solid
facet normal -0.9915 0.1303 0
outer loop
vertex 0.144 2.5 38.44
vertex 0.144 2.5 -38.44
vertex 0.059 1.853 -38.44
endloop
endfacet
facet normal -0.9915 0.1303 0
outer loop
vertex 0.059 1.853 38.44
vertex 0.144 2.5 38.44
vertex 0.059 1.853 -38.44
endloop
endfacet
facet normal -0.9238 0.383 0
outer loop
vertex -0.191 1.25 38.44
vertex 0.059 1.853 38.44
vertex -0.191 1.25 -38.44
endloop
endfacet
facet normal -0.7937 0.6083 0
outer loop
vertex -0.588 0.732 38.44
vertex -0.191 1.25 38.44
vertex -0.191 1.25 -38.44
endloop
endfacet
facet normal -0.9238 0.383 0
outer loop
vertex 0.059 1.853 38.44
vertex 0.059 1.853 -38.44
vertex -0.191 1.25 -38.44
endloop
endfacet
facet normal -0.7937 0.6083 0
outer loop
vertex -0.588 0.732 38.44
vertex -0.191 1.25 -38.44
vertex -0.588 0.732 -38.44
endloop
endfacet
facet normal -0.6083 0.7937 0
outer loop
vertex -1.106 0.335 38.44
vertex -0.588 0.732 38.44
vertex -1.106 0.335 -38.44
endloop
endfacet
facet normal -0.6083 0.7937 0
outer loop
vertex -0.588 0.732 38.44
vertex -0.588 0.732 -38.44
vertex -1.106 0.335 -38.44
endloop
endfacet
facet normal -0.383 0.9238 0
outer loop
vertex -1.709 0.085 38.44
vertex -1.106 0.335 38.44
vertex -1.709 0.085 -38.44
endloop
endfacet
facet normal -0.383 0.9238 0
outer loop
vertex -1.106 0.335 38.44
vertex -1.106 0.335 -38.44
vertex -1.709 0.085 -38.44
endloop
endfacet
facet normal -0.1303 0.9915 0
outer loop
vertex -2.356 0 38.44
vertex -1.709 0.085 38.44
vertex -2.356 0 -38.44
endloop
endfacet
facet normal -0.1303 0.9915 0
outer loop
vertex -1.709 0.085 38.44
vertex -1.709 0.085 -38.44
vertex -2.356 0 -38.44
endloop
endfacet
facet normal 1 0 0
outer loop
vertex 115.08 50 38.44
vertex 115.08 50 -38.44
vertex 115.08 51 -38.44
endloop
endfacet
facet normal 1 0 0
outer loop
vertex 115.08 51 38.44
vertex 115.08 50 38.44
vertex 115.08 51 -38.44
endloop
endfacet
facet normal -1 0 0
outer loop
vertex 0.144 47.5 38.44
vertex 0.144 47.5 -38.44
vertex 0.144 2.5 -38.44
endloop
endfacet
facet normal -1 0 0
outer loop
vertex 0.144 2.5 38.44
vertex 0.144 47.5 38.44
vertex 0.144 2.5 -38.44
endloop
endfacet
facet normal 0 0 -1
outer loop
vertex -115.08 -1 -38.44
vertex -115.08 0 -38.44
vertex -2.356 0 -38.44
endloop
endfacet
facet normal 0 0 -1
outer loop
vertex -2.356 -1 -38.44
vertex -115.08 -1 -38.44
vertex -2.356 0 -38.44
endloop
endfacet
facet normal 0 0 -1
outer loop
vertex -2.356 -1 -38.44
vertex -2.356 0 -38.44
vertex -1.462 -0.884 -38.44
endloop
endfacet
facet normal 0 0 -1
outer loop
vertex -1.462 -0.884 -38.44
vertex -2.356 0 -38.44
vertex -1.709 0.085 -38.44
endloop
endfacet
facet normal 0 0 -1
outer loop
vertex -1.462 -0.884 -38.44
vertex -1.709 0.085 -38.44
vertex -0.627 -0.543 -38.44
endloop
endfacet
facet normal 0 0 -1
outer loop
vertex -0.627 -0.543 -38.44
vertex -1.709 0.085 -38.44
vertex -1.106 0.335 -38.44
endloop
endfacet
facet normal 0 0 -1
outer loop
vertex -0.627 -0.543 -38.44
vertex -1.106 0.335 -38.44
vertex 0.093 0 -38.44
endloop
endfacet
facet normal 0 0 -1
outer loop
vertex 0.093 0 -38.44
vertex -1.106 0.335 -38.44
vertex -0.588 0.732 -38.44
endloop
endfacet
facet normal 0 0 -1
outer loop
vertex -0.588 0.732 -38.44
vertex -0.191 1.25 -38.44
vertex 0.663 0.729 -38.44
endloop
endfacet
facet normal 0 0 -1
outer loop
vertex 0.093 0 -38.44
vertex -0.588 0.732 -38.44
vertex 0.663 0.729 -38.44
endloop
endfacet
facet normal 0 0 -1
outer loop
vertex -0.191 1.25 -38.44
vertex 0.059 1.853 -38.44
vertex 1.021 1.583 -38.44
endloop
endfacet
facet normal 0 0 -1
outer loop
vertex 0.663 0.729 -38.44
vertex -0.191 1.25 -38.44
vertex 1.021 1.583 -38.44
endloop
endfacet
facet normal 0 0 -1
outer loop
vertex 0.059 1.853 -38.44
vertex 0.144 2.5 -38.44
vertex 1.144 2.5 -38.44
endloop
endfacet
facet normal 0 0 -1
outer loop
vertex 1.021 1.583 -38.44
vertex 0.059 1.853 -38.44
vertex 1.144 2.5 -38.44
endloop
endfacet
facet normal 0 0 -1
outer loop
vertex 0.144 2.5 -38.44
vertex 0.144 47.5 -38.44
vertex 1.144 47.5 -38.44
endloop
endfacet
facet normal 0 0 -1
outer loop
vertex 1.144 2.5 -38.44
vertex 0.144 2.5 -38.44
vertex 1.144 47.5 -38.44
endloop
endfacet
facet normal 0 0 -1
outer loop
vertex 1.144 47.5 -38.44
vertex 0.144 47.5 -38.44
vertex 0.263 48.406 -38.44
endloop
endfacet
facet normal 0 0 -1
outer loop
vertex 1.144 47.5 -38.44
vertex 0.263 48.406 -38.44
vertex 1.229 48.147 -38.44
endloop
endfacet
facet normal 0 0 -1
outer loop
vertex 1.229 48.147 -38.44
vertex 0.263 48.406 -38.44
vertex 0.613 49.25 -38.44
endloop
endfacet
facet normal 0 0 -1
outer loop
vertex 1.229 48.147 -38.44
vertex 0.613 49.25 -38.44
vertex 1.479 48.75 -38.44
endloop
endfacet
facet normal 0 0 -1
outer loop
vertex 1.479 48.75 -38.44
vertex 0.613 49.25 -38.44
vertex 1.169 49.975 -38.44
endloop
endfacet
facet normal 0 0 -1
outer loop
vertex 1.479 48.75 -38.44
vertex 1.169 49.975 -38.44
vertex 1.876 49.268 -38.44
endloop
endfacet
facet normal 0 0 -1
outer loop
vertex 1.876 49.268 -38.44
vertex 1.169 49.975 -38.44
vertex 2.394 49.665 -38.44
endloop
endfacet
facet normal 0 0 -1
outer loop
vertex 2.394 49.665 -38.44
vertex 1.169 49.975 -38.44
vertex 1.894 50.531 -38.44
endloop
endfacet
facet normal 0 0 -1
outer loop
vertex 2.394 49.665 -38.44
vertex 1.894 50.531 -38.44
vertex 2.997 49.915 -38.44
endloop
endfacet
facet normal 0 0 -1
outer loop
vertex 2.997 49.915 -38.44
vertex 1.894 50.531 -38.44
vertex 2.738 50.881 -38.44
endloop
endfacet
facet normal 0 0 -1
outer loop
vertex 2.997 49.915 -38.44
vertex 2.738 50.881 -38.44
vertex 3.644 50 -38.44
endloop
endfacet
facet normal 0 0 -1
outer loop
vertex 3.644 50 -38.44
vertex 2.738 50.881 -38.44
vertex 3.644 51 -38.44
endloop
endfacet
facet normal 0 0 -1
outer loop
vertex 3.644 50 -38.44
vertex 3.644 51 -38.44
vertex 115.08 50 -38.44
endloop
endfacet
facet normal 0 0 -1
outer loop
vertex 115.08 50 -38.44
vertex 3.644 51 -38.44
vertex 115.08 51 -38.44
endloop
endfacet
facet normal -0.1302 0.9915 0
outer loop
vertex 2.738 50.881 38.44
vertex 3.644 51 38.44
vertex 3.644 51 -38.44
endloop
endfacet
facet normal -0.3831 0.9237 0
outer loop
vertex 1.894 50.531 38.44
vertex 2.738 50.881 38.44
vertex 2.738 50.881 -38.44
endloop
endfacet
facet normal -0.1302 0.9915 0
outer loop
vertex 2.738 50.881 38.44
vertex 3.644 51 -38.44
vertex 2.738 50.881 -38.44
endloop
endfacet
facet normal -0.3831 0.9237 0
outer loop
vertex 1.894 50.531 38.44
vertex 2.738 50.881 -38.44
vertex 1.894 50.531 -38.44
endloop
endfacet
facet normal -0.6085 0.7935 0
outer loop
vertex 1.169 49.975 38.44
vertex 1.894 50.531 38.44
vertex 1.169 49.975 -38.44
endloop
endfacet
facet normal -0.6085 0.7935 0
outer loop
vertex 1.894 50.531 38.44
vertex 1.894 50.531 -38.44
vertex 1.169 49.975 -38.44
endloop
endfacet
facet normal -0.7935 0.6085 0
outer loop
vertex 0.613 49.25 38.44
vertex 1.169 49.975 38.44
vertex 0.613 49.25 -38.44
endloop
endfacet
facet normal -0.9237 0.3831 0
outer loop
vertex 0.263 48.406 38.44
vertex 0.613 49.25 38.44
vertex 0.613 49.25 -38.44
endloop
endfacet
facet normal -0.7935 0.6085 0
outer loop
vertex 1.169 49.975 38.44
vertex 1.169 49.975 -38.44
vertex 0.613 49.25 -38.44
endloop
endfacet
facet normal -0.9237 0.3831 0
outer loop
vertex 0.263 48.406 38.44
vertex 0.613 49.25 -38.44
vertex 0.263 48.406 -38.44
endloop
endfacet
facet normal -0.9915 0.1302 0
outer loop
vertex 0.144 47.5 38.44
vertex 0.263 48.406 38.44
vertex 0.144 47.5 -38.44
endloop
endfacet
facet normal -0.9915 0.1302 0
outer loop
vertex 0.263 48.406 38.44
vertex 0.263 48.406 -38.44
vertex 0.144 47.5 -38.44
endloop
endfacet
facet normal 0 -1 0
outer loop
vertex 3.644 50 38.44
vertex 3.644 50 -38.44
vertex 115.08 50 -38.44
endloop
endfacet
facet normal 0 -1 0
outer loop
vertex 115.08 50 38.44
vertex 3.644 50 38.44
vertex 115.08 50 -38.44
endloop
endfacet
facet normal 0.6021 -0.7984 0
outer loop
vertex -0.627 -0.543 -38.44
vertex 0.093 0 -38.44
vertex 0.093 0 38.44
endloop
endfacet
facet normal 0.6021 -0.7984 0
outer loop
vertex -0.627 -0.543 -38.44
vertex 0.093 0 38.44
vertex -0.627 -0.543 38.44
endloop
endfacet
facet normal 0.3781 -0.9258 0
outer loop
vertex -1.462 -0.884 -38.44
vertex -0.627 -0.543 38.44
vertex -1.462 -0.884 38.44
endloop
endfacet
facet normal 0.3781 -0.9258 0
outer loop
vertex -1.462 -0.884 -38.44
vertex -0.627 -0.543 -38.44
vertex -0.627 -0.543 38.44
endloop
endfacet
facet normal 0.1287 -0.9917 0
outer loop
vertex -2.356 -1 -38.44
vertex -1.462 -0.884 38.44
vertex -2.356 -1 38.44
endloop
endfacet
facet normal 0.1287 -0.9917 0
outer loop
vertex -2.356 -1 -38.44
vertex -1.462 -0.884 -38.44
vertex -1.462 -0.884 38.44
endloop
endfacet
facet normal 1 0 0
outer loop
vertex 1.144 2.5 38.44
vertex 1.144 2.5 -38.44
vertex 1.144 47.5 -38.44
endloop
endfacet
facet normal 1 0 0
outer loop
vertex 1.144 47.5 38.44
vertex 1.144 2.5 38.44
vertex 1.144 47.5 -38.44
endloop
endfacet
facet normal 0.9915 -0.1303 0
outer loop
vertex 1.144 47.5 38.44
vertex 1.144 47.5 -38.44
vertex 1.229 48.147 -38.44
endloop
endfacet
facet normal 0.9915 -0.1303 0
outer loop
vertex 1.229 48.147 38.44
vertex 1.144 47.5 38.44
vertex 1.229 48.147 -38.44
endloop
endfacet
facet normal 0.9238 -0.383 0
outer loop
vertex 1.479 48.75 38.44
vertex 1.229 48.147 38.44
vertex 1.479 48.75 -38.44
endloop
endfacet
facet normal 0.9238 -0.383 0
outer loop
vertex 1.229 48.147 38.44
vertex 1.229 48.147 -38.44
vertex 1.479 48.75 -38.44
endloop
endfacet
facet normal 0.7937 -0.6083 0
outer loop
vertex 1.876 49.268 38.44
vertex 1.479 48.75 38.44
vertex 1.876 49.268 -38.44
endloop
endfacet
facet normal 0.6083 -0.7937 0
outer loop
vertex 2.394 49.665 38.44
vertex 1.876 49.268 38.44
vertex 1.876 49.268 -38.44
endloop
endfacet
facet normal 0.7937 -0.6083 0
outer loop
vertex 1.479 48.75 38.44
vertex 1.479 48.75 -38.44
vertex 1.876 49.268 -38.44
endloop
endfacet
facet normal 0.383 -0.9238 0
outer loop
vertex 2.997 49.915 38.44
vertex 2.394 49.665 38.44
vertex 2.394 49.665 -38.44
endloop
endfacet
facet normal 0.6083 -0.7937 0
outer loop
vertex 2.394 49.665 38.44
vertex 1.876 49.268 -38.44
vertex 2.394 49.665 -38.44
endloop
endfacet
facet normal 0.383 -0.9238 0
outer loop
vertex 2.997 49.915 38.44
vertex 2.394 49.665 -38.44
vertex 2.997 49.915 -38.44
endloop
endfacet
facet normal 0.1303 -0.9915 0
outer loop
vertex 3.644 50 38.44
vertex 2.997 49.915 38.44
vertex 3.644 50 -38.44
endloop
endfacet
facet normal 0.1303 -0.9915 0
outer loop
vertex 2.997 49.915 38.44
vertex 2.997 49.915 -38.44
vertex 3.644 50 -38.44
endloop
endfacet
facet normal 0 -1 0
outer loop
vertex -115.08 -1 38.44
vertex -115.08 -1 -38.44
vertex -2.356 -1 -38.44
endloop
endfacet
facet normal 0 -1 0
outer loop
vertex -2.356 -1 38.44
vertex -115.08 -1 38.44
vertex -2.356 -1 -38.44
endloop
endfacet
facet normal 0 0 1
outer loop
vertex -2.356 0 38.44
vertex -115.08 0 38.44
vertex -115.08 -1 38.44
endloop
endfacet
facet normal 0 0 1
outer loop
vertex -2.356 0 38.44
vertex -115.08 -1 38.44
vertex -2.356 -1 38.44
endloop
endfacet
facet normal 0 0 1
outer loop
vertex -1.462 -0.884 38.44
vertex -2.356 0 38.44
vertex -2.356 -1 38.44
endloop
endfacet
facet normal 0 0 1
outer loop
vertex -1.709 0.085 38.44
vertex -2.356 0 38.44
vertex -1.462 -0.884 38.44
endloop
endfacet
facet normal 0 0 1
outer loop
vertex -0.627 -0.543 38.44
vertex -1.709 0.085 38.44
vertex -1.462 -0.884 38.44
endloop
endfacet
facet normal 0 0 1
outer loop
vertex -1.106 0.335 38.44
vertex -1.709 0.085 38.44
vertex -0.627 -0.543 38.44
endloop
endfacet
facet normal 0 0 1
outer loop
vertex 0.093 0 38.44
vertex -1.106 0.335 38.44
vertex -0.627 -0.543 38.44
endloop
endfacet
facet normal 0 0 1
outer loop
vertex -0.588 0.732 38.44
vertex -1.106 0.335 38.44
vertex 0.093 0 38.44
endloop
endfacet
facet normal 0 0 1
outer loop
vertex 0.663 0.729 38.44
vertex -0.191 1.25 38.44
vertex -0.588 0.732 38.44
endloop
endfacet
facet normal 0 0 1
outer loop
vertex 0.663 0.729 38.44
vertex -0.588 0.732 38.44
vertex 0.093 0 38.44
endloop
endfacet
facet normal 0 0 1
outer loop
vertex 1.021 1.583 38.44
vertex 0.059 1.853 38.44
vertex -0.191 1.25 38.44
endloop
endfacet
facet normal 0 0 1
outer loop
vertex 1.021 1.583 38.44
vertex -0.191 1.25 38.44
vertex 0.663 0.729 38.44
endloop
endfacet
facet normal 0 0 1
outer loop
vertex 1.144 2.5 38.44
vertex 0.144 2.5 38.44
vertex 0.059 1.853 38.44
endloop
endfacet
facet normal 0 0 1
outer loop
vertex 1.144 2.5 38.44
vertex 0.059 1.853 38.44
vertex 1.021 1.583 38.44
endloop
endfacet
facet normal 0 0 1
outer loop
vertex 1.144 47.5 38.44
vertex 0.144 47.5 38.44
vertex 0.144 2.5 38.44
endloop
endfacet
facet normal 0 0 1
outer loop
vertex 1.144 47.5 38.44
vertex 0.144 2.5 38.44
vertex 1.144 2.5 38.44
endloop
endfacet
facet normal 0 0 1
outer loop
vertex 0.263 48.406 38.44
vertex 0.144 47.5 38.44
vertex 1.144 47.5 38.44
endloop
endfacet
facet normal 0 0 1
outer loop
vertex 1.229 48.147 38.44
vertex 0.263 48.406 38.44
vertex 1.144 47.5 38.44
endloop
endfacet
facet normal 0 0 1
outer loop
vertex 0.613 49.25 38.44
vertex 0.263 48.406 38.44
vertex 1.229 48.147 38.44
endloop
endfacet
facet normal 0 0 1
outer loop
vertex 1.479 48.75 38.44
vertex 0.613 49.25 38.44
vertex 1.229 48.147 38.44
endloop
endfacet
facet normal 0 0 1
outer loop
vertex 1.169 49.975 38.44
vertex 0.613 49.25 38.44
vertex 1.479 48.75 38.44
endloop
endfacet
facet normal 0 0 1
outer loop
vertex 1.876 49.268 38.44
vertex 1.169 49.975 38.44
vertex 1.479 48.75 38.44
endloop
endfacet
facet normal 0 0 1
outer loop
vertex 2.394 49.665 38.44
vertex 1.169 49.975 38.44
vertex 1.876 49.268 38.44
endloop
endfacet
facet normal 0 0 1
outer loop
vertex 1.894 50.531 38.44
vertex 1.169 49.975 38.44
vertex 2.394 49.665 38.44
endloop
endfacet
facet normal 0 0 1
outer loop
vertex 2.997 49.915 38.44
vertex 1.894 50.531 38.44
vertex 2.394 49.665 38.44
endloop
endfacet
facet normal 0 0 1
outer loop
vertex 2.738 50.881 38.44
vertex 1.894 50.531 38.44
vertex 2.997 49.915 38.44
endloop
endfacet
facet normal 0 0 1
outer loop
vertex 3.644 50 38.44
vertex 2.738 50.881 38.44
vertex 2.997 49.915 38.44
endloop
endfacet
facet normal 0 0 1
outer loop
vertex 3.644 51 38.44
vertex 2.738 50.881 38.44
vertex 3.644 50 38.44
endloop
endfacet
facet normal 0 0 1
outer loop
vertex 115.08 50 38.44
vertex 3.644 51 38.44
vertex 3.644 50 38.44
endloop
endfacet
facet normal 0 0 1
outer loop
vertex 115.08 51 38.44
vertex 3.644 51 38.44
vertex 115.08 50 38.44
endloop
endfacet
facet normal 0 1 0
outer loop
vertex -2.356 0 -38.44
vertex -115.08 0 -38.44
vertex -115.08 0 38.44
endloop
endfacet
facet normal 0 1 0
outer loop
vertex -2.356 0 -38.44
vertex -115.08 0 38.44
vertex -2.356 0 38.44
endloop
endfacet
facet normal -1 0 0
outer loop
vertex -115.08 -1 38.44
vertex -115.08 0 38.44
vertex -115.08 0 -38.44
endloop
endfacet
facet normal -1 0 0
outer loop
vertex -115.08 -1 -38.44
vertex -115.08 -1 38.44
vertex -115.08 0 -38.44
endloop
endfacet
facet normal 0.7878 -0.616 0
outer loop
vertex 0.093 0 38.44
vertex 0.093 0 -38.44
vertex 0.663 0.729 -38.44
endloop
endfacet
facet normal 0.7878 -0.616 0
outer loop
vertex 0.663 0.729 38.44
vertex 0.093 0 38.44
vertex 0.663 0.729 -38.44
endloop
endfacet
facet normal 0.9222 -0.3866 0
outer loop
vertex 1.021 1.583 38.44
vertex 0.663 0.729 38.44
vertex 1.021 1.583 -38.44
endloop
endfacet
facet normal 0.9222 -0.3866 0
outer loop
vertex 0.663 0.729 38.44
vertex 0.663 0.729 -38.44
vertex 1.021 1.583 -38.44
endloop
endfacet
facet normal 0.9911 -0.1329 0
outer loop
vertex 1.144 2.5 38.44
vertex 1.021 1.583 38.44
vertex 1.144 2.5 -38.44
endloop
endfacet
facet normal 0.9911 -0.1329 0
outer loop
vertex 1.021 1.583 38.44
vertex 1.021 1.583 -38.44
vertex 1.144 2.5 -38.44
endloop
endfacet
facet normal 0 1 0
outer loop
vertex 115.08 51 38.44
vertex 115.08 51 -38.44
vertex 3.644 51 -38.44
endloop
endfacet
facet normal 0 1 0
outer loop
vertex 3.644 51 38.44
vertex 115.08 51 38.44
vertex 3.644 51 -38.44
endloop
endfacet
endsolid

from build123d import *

# Parameters (mm, degrees)
SKETCH_1_W             = 230.160423268
SKETCH_1_H             = 76.880643476
SM_BASE_FLANGE_1_DEPTH = 1
OTHER_START            = -38.440321738
OTHER_1_DEPTH          = 76.880643476
OTHER_1_2_DEPTH        = 76.880643476


# Read off the part's stored shape, not the designer's step: 转折1
# Sheet-metal steps are written as plain solids
with BuildPart() as part:
    # Sketch 1 → 基体-法兰1 (new body)
    with BuildSketch(Plane(origin=(0, 0, 0), x_dir=(1, 0, 0), z_dir=(0, 1, 0))):
        Rectangle(SKETCH_1_W, SKETCH_1_H)
    extrude(amount=-SM_BASE_FLANGE_1_DEPTH)

    # Other 1 outline → Other 1 (cut)
    with BuildSketch(Plane.XY.offset(OTHER_START)):
        with BuildLine():
            Line((115.080211634, 0), (0.093295252, 0))
            ThreePointArc((0.093295252, 0), (-1.033318835, -0.740370349), (-2.35619449, -1))
            Line((-2.35619449, -1), (115.080211634, -1))
            Line((115.080211634, -1), (115.080211634, 0))
        make_face()
    extrude(amount=OTHER_1_DEPTH, mode=Mode.SUBTRACT)

    # Other 1 2 outline → Other 1 2 (add)
    with BuildSketch(Plane.XY.offset(OTHER_START)):
        with BuildLine():
            ThreePointArc((3.64380551, 51), (1.168931776, 49.974873734), (0.14380551, 47.5))
            Line((0.14380551, 47.5), (0.14380551, 2.5))
            ThreePointArc((0.14380551, 2.5), (-0.588427537, 0.732233047), (-2.35619449, 0))
            Line((-2.35619449, 0), (0.093295252, 0))
            ThreePointArc((0.093295252, 0), (0.870507704, 1.144126499), (1.14380551, 2.5))
            Line((1.14380551, 2.5), (1.14380551, 47.5))
            ThreePointArc((1.14380551, 47.5), (1.876038557, 49.267766953), (3.64380551, 50))
            Line((3.64380551, 50), (115.080211634, 50))
            Line((115.080211634, 50), (115.080211634, 51))
            Line((115.080211634, 51), (3.64380551, 51))
        make_face()
    extrude(amount=OTHER_1_2_DEPTH)


solid = part.part
